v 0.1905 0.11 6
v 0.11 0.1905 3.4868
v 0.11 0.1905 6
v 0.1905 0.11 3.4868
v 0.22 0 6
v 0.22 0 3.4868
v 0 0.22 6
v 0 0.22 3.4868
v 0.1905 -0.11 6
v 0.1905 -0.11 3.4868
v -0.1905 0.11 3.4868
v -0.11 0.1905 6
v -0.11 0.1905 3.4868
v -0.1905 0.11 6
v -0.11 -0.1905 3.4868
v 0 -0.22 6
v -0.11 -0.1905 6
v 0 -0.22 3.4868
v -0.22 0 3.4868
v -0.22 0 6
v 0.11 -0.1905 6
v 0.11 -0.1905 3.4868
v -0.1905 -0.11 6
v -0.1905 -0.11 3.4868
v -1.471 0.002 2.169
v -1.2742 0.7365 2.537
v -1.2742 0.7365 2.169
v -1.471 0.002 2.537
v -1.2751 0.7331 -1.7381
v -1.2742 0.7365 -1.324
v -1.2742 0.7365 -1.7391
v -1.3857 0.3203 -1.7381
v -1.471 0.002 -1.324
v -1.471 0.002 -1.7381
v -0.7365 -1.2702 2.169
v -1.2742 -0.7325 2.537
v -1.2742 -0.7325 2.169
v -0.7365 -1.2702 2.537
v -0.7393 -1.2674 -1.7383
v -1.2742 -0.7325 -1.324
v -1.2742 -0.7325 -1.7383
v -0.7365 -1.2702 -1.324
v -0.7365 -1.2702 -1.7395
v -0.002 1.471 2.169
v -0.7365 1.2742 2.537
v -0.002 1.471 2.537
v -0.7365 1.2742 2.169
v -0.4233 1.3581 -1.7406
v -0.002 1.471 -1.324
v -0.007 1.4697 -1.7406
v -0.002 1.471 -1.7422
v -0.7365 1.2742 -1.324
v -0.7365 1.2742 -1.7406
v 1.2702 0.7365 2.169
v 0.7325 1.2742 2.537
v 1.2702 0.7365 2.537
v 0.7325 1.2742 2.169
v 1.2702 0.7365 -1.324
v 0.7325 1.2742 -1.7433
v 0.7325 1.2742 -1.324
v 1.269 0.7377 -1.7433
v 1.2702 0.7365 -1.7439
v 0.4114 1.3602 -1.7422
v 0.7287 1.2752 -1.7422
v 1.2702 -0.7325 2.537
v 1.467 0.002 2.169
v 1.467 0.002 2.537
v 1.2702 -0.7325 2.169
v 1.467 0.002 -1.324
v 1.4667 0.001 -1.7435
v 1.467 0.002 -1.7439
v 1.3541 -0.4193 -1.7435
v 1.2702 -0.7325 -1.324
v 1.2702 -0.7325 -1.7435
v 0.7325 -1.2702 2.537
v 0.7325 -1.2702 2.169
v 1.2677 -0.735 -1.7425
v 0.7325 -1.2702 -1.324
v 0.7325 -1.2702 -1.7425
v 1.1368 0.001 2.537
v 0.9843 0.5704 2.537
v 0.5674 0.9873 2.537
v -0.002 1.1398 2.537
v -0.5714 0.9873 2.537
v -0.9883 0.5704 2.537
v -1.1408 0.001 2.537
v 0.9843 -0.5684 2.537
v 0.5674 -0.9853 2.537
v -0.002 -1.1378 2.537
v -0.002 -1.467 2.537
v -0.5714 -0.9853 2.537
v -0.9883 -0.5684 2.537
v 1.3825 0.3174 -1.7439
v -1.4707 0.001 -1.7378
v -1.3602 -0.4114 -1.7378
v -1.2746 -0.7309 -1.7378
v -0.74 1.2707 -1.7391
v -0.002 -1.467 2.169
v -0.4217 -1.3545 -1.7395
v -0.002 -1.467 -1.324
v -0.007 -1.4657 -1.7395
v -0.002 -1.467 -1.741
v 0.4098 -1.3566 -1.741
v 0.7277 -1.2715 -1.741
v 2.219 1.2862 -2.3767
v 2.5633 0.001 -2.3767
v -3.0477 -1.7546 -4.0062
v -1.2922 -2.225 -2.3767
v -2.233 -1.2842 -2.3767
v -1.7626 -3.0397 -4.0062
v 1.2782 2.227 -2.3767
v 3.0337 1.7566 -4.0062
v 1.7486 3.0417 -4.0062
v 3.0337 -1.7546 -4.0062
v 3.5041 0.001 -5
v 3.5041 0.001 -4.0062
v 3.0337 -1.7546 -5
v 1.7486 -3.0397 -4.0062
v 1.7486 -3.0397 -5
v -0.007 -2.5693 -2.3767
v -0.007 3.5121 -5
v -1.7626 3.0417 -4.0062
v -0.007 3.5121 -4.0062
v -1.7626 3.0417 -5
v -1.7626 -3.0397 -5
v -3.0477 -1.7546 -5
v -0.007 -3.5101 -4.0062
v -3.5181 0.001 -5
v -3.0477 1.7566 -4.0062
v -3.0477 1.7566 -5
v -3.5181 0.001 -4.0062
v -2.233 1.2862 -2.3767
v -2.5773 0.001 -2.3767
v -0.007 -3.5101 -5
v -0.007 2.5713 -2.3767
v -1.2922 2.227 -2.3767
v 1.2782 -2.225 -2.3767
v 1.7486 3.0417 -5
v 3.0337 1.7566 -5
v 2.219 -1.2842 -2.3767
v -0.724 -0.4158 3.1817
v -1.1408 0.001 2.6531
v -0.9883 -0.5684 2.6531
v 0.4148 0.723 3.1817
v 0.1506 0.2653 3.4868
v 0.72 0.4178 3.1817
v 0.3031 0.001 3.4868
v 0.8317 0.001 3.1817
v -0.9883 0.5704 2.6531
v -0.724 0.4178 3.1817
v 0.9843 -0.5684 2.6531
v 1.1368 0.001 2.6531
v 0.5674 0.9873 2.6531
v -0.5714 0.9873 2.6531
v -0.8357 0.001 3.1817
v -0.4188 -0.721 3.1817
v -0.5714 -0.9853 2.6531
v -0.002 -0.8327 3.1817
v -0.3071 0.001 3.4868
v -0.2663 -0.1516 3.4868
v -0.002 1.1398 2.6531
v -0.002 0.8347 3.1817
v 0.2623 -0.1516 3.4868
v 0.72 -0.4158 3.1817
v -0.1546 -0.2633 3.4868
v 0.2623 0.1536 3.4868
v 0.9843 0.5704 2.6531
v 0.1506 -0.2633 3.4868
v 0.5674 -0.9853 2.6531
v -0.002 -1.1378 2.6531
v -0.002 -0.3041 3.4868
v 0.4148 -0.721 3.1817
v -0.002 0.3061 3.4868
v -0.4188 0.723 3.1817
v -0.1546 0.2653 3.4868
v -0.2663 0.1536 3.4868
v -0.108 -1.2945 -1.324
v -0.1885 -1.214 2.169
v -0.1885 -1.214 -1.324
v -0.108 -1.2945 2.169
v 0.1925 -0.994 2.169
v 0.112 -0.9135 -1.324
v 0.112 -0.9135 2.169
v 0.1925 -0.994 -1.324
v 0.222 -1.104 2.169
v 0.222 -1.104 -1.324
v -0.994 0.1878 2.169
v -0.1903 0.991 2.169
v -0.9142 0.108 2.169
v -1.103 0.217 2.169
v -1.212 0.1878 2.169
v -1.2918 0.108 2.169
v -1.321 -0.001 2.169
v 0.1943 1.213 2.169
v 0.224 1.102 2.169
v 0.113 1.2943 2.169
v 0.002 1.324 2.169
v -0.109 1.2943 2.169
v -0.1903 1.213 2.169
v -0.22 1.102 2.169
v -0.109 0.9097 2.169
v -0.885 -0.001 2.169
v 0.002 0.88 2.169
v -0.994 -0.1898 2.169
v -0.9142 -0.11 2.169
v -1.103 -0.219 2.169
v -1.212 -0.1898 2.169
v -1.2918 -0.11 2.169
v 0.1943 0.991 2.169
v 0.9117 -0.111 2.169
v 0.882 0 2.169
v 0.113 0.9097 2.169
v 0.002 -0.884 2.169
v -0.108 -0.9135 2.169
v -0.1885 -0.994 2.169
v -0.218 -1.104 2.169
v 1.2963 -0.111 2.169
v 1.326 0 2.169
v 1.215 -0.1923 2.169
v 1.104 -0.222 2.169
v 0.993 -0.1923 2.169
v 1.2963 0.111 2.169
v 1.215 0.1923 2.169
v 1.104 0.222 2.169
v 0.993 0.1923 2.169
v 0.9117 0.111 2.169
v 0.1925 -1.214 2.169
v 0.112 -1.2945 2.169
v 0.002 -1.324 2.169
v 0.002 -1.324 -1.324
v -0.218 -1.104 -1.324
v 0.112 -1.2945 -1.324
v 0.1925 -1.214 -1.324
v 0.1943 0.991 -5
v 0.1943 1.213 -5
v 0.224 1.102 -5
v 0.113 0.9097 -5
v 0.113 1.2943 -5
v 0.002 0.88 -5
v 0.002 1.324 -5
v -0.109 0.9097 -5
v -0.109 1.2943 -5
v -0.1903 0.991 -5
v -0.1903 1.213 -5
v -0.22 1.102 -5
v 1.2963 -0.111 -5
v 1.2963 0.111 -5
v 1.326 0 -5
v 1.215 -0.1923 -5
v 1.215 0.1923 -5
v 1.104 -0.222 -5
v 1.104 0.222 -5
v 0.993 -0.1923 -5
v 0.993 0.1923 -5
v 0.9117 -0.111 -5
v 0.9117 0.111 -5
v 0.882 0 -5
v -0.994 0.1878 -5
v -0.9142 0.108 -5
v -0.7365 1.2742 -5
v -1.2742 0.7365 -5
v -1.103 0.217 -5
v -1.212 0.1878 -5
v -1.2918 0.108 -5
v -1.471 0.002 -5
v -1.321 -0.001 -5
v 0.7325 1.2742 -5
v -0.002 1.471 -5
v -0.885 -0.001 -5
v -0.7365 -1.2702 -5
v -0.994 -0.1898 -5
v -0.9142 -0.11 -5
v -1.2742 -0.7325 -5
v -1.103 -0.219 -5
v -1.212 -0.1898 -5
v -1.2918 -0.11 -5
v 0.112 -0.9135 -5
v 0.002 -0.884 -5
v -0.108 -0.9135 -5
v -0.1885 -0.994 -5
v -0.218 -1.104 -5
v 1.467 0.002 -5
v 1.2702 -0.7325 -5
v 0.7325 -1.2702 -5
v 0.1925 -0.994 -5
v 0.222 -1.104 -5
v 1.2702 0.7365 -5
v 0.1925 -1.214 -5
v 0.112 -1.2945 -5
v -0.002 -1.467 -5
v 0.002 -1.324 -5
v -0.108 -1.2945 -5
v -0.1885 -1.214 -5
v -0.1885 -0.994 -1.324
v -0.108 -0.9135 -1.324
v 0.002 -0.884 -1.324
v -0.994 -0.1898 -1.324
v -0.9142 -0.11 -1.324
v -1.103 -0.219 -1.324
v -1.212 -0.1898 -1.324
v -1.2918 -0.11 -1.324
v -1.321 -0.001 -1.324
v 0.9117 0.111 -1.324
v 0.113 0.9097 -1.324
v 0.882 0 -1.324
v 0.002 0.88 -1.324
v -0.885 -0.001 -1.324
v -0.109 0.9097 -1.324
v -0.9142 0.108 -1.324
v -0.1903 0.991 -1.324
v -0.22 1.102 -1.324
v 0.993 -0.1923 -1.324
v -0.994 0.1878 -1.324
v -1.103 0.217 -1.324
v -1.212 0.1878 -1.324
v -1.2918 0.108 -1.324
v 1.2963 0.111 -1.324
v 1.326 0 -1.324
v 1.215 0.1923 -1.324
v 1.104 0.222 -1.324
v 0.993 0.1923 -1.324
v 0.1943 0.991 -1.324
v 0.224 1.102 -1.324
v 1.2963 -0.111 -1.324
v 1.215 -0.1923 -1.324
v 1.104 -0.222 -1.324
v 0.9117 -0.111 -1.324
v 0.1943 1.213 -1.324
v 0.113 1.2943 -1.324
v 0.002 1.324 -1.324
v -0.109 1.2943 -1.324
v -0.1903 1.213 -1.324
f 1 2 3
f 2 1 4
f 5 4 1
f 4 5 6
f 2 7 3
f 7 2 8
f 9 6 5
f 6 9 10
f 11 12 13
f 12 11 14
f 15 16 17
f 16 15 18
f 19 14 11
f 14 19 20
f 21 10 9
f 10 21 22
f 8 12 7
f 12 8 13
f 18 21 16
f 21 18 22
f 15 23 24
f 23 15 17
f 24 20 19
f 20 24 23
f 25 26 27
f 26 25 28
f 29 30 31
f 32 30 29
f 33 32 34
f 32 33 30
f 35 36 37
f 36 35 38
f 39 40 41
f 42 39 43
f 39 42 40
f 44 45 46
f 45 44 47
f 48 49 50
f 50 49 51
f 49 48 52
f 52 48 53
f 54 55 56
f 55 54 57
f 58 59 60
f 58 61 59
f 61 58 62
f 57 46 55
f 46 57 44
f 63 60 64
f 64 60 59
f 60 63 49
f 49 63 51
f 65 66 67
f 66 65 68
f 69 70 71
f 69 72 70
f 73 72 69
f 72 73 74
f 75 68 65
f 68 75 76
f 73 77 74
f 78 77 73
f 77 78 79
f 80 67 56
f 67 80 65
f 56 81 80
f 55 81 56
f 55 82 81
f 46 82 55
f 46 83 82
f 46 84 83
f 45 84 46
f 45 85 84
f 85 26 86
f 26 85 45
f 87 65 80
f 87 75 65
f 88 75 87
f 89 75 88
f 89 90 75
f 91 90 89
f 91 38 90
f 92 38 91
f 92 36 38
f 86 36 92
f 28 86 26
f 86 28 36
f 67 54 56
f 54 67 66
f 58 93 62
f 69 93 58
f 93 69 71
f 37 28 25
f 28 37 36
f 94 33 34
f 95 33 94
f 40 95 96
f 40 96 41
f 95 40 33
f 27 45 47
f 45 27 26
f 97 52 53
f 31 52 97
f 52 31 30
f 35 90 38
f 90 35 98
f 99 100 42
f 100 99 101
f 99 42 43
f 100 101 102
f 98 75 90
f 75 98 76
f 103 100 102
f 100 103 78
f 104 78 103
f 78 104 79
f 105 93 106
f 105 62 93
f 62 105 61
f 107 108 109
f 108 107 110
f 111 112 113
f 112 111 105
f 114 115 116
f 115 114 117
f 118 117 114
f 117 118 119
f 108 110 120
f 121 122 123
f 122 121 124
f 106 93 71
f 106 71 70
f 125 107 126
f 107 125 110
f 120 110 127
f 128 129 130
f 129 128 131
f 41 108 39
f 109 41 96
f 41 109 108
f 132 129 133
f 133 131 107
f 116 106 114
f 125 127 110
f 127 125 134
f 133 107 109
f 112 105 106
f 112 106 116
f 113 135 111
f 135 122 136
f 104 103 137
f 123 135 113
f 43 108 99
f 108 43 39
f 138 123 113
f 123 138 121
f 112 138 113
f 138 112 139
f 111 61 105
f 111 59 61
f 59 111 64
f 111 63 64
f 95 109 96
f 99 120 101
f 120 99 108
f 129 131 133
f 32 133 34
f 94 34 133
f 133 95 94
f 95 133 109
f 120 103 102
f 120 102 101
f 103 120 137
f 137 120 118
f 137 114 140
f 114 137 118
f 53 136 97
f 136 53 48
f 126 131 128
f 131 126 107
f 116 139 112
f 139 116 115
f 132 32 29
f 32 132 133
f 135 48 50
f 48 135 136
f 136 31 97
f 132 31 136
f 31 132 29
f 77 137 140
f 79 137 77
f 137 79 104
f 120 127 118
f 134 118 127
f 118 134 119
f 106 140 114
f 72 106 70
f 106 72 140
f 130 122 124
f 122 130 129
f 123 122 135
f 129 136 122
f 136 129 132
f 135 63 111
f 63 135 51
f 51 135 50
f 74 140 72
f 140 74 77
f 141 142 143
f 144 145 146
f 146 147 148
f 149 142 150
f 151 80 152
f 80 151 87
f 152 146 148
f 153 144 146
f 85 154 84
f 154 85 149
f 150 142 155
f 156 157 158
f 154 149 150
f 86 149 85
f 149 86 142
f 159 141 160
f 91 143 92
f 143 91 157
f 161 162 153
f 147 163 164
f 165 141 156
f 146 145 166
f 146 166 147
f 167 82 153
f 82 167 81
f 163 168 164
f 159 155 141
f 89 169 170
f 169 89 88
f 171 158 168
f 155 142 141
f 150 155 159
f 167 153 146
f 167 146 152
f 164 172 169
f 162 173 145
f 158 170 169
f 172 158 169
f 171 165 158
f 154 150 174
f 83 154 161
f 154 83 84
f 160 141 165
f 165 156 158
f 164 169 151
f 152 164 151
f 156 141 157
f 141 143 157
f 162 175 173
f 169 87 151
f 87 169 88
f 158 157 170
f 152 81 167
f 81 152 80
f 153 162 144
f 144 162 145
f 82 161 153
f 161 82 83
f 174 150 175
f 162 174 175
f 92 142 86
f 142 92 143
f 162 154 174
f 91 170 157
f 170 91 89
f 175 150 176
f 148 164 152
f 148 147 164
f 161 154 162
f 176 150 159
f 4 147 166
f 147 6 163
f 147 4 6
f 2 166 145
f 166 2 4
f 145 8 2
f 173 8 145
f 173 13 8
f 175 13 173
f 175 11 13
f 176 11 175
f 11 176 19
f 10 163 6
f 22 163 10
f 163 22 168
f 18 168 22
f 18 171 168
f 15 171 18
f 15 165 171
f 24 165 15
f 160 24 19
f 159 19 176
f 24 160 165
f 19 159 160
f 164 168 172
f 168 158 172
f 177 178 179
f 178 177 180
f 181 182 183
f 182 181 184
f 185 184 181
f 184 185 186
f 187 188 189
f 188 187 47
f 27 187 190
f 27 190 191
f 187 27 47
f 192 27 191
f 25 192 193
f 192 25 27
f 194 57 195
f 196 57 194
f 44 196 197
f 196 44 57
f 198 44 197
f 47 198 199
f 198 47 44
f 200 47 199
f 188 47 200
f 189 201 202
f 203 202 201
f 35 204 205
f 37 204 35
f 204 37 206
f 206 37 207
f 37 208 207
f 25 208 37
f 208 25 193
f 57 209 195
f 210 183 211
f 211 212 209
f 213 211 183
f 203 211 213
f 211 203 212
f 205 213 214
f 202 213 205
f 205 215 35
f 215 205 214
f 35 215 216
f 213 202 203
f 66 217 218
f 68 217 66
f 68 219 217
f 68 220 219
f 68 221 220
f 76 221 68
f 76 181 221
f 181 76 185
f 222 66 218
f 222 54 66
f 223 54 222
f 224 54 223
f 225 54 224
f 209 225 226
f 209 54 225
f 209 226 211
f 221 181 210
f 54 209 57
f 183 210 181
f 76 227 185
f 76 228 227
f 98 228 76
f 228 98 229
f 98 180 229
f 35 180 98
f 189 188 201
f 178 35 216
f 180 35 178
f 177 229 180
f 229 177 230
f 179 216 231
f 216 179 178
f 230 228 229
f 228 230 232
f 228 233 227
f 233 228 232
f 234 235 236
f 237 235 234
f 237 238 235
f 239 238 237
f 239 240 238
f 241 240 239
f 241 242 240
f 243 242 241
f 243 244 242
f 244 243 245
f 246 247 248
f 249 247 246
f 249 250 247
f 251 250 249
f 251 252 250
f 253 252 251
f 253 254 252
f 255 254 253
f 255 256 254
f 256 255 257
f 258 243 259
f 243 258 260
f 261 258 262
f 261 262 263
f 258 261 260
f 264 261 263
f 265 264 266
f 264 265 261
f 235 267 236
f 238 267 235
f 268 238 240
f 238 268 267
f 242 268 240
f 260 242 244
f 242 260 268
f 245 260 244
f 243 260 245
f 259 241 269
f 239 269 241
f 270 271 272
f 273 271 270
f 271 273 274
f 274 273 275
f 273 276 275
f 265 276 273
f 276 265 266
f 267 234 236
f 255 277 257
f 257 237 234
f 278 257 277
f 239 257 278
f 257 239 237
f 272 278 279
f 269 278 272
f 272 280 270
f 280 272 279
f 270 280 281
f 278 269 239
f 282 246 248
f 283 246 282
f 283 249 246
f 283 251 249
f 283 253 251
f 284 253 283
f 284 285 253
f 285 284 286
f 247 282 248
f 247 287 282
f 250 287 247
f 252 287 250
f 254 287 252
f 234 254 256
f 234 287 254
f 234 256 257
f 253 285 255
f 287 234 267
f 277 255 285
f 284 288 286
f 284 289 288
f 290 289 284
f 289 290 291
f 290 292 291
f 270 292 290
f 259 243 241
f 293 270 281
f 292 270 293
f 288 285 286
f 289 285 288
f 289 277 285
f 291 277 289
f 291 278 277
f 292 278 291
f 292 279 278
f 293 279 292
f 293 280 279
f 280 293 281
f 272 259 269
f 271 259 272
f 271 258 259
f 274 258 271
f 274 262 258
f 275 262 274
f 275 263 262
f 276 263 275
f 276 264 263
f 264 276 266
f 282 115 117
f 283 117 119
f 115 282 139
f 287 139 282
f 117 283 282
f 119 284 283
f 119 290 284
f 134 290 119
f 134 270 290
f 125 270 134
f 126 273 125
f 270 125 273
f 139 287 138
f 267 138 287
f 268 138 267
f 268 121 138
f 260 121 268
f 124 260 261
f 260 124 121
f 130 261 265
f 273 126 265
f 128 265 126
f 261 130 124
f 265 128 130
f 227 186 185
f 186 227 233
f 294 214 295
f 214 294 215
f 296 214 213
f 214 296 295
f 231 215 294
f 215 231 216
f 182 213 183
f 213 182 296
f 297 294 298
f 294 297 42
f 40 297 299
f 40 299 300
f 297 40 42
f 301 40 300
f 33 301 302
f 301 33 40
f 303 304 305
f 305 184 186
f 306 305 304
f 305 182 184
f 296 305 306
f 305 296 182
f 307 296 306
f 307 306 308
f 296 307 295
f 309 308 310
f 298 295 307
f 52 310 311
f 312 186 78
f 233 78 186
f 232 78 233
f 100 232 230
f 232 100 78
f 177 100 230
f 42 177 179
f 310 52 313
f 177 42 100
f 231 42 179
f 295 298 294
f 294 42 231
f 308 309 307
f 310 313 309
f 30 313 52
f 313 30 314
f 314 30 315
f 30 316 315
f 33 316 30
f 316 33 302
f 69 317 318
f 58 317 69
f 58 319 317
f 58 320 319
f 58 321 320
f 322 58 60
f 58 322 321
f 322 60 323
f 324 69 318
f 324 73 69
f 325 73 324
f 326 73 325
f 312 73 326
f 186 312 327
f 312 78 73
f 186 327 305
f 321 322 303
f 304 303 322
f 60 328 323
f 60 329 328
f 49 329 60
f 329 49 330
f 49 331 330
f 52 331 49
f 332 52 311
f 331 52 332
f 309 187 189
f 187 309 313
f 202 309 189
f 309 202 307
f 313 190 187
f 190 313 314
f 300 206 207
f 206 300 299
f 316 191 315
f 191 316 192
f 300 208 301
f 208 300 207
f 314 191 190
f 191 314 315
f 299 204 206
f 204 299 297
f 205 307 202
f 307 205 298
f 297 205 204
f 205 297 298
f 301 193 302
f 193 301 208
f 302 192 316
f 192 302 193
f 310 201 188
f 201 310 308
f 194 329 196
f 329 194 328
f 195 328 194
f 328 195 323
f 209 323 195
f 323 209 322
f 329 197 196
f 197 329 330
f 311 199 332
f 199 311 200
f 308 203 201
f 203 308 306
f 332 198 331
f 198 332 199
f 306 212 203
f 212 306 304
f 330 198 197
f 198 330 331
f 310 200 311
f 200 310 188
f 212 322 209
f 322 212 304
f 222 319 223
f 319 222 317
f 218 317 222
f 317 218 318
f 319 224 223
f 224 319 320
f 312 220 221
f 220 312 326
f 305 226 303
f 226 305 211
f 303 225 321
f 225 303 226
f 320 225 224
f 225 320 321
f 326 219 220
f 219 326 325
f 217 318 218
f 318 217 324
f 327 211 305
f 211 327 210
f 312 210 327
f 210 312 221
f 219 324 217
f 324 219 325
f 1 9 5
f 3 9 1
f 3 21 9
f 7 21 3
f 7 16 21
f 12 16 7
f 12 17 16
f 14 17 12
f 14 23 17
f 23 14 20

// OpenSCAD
intersection() {
    union() {
        translate([0.002, 1.102, -5])
        cylinder(h = 7.169, r1 = 0.222, r2 = 0.222, center = false, $fn = 12);
        intersection() {
            union() {
                rotate([180, 0, 180])
                translate([0.002, 0.002, -2.537])

                cylinder(h = 20.737, r1 = 1.469, r2 = 1.469, center = false, $fn = 12);
                translate([-0.007, 0.001, -4.947]) sphere(r = 3.635, $fn = 12);

                intersection() {
                    translate([0, 0, -1.324])
                    cylinder(h = 19.524, r1 = 0.22, r2 = 0.22, center = false, $fn = 12);
                    translate([0, 0, 0]) sphere(r = 54.6, $fn = 12);
                }
                translate([-0.002, 0.001, 2.348]) sphere(r = 1.179, $fn = 12);
            }
                union() {
                    intersection() {
                        translate([0.002, -1.104, -5])
                        cylinder(h = 7.169, r1 = 0.22, r2 = 0.22, center = false, $fn = 12);
                        translate([0, 0, 0])
                            sphere(r = 54.6, $fn = 12);
                    }
                    translate([-1.103, -0.001, -5])
                    cylinder(h = 7.169, r1 = 0.218, r2 = 0.218, center = false, $fn = 12);
                    difference() {
                        union() {
                            rotate([180, 0, 180])
                            translate([0.002, 0.002, -18.2])
                            cylinder(h = 16.031, r1 = 1.469, r2 = 1.469, center = false, $fn = 12);
                            translate([-18.2, -18.2, -5]) cube(size = [36.4, 36.4, 3.676], center = false);
                        }
                        rotate([180, 0, 180])
                        translate([0.002, 0.002, 5])
                        cylinder(h = 13.2, r1 = 1.469, r2 = 1.469, center = false, $fn = 12);
                    }
                }
        }
        translate([1.104, 0, -5])
        cylinder(h = 7.537, r1 = 0.222, r2 = 0.222, center = false, $fn = 12);
    }
    translate([-4.406, -4.406, -6])
        cube(size = [8.811, 8.811, 12], center = false);
}
